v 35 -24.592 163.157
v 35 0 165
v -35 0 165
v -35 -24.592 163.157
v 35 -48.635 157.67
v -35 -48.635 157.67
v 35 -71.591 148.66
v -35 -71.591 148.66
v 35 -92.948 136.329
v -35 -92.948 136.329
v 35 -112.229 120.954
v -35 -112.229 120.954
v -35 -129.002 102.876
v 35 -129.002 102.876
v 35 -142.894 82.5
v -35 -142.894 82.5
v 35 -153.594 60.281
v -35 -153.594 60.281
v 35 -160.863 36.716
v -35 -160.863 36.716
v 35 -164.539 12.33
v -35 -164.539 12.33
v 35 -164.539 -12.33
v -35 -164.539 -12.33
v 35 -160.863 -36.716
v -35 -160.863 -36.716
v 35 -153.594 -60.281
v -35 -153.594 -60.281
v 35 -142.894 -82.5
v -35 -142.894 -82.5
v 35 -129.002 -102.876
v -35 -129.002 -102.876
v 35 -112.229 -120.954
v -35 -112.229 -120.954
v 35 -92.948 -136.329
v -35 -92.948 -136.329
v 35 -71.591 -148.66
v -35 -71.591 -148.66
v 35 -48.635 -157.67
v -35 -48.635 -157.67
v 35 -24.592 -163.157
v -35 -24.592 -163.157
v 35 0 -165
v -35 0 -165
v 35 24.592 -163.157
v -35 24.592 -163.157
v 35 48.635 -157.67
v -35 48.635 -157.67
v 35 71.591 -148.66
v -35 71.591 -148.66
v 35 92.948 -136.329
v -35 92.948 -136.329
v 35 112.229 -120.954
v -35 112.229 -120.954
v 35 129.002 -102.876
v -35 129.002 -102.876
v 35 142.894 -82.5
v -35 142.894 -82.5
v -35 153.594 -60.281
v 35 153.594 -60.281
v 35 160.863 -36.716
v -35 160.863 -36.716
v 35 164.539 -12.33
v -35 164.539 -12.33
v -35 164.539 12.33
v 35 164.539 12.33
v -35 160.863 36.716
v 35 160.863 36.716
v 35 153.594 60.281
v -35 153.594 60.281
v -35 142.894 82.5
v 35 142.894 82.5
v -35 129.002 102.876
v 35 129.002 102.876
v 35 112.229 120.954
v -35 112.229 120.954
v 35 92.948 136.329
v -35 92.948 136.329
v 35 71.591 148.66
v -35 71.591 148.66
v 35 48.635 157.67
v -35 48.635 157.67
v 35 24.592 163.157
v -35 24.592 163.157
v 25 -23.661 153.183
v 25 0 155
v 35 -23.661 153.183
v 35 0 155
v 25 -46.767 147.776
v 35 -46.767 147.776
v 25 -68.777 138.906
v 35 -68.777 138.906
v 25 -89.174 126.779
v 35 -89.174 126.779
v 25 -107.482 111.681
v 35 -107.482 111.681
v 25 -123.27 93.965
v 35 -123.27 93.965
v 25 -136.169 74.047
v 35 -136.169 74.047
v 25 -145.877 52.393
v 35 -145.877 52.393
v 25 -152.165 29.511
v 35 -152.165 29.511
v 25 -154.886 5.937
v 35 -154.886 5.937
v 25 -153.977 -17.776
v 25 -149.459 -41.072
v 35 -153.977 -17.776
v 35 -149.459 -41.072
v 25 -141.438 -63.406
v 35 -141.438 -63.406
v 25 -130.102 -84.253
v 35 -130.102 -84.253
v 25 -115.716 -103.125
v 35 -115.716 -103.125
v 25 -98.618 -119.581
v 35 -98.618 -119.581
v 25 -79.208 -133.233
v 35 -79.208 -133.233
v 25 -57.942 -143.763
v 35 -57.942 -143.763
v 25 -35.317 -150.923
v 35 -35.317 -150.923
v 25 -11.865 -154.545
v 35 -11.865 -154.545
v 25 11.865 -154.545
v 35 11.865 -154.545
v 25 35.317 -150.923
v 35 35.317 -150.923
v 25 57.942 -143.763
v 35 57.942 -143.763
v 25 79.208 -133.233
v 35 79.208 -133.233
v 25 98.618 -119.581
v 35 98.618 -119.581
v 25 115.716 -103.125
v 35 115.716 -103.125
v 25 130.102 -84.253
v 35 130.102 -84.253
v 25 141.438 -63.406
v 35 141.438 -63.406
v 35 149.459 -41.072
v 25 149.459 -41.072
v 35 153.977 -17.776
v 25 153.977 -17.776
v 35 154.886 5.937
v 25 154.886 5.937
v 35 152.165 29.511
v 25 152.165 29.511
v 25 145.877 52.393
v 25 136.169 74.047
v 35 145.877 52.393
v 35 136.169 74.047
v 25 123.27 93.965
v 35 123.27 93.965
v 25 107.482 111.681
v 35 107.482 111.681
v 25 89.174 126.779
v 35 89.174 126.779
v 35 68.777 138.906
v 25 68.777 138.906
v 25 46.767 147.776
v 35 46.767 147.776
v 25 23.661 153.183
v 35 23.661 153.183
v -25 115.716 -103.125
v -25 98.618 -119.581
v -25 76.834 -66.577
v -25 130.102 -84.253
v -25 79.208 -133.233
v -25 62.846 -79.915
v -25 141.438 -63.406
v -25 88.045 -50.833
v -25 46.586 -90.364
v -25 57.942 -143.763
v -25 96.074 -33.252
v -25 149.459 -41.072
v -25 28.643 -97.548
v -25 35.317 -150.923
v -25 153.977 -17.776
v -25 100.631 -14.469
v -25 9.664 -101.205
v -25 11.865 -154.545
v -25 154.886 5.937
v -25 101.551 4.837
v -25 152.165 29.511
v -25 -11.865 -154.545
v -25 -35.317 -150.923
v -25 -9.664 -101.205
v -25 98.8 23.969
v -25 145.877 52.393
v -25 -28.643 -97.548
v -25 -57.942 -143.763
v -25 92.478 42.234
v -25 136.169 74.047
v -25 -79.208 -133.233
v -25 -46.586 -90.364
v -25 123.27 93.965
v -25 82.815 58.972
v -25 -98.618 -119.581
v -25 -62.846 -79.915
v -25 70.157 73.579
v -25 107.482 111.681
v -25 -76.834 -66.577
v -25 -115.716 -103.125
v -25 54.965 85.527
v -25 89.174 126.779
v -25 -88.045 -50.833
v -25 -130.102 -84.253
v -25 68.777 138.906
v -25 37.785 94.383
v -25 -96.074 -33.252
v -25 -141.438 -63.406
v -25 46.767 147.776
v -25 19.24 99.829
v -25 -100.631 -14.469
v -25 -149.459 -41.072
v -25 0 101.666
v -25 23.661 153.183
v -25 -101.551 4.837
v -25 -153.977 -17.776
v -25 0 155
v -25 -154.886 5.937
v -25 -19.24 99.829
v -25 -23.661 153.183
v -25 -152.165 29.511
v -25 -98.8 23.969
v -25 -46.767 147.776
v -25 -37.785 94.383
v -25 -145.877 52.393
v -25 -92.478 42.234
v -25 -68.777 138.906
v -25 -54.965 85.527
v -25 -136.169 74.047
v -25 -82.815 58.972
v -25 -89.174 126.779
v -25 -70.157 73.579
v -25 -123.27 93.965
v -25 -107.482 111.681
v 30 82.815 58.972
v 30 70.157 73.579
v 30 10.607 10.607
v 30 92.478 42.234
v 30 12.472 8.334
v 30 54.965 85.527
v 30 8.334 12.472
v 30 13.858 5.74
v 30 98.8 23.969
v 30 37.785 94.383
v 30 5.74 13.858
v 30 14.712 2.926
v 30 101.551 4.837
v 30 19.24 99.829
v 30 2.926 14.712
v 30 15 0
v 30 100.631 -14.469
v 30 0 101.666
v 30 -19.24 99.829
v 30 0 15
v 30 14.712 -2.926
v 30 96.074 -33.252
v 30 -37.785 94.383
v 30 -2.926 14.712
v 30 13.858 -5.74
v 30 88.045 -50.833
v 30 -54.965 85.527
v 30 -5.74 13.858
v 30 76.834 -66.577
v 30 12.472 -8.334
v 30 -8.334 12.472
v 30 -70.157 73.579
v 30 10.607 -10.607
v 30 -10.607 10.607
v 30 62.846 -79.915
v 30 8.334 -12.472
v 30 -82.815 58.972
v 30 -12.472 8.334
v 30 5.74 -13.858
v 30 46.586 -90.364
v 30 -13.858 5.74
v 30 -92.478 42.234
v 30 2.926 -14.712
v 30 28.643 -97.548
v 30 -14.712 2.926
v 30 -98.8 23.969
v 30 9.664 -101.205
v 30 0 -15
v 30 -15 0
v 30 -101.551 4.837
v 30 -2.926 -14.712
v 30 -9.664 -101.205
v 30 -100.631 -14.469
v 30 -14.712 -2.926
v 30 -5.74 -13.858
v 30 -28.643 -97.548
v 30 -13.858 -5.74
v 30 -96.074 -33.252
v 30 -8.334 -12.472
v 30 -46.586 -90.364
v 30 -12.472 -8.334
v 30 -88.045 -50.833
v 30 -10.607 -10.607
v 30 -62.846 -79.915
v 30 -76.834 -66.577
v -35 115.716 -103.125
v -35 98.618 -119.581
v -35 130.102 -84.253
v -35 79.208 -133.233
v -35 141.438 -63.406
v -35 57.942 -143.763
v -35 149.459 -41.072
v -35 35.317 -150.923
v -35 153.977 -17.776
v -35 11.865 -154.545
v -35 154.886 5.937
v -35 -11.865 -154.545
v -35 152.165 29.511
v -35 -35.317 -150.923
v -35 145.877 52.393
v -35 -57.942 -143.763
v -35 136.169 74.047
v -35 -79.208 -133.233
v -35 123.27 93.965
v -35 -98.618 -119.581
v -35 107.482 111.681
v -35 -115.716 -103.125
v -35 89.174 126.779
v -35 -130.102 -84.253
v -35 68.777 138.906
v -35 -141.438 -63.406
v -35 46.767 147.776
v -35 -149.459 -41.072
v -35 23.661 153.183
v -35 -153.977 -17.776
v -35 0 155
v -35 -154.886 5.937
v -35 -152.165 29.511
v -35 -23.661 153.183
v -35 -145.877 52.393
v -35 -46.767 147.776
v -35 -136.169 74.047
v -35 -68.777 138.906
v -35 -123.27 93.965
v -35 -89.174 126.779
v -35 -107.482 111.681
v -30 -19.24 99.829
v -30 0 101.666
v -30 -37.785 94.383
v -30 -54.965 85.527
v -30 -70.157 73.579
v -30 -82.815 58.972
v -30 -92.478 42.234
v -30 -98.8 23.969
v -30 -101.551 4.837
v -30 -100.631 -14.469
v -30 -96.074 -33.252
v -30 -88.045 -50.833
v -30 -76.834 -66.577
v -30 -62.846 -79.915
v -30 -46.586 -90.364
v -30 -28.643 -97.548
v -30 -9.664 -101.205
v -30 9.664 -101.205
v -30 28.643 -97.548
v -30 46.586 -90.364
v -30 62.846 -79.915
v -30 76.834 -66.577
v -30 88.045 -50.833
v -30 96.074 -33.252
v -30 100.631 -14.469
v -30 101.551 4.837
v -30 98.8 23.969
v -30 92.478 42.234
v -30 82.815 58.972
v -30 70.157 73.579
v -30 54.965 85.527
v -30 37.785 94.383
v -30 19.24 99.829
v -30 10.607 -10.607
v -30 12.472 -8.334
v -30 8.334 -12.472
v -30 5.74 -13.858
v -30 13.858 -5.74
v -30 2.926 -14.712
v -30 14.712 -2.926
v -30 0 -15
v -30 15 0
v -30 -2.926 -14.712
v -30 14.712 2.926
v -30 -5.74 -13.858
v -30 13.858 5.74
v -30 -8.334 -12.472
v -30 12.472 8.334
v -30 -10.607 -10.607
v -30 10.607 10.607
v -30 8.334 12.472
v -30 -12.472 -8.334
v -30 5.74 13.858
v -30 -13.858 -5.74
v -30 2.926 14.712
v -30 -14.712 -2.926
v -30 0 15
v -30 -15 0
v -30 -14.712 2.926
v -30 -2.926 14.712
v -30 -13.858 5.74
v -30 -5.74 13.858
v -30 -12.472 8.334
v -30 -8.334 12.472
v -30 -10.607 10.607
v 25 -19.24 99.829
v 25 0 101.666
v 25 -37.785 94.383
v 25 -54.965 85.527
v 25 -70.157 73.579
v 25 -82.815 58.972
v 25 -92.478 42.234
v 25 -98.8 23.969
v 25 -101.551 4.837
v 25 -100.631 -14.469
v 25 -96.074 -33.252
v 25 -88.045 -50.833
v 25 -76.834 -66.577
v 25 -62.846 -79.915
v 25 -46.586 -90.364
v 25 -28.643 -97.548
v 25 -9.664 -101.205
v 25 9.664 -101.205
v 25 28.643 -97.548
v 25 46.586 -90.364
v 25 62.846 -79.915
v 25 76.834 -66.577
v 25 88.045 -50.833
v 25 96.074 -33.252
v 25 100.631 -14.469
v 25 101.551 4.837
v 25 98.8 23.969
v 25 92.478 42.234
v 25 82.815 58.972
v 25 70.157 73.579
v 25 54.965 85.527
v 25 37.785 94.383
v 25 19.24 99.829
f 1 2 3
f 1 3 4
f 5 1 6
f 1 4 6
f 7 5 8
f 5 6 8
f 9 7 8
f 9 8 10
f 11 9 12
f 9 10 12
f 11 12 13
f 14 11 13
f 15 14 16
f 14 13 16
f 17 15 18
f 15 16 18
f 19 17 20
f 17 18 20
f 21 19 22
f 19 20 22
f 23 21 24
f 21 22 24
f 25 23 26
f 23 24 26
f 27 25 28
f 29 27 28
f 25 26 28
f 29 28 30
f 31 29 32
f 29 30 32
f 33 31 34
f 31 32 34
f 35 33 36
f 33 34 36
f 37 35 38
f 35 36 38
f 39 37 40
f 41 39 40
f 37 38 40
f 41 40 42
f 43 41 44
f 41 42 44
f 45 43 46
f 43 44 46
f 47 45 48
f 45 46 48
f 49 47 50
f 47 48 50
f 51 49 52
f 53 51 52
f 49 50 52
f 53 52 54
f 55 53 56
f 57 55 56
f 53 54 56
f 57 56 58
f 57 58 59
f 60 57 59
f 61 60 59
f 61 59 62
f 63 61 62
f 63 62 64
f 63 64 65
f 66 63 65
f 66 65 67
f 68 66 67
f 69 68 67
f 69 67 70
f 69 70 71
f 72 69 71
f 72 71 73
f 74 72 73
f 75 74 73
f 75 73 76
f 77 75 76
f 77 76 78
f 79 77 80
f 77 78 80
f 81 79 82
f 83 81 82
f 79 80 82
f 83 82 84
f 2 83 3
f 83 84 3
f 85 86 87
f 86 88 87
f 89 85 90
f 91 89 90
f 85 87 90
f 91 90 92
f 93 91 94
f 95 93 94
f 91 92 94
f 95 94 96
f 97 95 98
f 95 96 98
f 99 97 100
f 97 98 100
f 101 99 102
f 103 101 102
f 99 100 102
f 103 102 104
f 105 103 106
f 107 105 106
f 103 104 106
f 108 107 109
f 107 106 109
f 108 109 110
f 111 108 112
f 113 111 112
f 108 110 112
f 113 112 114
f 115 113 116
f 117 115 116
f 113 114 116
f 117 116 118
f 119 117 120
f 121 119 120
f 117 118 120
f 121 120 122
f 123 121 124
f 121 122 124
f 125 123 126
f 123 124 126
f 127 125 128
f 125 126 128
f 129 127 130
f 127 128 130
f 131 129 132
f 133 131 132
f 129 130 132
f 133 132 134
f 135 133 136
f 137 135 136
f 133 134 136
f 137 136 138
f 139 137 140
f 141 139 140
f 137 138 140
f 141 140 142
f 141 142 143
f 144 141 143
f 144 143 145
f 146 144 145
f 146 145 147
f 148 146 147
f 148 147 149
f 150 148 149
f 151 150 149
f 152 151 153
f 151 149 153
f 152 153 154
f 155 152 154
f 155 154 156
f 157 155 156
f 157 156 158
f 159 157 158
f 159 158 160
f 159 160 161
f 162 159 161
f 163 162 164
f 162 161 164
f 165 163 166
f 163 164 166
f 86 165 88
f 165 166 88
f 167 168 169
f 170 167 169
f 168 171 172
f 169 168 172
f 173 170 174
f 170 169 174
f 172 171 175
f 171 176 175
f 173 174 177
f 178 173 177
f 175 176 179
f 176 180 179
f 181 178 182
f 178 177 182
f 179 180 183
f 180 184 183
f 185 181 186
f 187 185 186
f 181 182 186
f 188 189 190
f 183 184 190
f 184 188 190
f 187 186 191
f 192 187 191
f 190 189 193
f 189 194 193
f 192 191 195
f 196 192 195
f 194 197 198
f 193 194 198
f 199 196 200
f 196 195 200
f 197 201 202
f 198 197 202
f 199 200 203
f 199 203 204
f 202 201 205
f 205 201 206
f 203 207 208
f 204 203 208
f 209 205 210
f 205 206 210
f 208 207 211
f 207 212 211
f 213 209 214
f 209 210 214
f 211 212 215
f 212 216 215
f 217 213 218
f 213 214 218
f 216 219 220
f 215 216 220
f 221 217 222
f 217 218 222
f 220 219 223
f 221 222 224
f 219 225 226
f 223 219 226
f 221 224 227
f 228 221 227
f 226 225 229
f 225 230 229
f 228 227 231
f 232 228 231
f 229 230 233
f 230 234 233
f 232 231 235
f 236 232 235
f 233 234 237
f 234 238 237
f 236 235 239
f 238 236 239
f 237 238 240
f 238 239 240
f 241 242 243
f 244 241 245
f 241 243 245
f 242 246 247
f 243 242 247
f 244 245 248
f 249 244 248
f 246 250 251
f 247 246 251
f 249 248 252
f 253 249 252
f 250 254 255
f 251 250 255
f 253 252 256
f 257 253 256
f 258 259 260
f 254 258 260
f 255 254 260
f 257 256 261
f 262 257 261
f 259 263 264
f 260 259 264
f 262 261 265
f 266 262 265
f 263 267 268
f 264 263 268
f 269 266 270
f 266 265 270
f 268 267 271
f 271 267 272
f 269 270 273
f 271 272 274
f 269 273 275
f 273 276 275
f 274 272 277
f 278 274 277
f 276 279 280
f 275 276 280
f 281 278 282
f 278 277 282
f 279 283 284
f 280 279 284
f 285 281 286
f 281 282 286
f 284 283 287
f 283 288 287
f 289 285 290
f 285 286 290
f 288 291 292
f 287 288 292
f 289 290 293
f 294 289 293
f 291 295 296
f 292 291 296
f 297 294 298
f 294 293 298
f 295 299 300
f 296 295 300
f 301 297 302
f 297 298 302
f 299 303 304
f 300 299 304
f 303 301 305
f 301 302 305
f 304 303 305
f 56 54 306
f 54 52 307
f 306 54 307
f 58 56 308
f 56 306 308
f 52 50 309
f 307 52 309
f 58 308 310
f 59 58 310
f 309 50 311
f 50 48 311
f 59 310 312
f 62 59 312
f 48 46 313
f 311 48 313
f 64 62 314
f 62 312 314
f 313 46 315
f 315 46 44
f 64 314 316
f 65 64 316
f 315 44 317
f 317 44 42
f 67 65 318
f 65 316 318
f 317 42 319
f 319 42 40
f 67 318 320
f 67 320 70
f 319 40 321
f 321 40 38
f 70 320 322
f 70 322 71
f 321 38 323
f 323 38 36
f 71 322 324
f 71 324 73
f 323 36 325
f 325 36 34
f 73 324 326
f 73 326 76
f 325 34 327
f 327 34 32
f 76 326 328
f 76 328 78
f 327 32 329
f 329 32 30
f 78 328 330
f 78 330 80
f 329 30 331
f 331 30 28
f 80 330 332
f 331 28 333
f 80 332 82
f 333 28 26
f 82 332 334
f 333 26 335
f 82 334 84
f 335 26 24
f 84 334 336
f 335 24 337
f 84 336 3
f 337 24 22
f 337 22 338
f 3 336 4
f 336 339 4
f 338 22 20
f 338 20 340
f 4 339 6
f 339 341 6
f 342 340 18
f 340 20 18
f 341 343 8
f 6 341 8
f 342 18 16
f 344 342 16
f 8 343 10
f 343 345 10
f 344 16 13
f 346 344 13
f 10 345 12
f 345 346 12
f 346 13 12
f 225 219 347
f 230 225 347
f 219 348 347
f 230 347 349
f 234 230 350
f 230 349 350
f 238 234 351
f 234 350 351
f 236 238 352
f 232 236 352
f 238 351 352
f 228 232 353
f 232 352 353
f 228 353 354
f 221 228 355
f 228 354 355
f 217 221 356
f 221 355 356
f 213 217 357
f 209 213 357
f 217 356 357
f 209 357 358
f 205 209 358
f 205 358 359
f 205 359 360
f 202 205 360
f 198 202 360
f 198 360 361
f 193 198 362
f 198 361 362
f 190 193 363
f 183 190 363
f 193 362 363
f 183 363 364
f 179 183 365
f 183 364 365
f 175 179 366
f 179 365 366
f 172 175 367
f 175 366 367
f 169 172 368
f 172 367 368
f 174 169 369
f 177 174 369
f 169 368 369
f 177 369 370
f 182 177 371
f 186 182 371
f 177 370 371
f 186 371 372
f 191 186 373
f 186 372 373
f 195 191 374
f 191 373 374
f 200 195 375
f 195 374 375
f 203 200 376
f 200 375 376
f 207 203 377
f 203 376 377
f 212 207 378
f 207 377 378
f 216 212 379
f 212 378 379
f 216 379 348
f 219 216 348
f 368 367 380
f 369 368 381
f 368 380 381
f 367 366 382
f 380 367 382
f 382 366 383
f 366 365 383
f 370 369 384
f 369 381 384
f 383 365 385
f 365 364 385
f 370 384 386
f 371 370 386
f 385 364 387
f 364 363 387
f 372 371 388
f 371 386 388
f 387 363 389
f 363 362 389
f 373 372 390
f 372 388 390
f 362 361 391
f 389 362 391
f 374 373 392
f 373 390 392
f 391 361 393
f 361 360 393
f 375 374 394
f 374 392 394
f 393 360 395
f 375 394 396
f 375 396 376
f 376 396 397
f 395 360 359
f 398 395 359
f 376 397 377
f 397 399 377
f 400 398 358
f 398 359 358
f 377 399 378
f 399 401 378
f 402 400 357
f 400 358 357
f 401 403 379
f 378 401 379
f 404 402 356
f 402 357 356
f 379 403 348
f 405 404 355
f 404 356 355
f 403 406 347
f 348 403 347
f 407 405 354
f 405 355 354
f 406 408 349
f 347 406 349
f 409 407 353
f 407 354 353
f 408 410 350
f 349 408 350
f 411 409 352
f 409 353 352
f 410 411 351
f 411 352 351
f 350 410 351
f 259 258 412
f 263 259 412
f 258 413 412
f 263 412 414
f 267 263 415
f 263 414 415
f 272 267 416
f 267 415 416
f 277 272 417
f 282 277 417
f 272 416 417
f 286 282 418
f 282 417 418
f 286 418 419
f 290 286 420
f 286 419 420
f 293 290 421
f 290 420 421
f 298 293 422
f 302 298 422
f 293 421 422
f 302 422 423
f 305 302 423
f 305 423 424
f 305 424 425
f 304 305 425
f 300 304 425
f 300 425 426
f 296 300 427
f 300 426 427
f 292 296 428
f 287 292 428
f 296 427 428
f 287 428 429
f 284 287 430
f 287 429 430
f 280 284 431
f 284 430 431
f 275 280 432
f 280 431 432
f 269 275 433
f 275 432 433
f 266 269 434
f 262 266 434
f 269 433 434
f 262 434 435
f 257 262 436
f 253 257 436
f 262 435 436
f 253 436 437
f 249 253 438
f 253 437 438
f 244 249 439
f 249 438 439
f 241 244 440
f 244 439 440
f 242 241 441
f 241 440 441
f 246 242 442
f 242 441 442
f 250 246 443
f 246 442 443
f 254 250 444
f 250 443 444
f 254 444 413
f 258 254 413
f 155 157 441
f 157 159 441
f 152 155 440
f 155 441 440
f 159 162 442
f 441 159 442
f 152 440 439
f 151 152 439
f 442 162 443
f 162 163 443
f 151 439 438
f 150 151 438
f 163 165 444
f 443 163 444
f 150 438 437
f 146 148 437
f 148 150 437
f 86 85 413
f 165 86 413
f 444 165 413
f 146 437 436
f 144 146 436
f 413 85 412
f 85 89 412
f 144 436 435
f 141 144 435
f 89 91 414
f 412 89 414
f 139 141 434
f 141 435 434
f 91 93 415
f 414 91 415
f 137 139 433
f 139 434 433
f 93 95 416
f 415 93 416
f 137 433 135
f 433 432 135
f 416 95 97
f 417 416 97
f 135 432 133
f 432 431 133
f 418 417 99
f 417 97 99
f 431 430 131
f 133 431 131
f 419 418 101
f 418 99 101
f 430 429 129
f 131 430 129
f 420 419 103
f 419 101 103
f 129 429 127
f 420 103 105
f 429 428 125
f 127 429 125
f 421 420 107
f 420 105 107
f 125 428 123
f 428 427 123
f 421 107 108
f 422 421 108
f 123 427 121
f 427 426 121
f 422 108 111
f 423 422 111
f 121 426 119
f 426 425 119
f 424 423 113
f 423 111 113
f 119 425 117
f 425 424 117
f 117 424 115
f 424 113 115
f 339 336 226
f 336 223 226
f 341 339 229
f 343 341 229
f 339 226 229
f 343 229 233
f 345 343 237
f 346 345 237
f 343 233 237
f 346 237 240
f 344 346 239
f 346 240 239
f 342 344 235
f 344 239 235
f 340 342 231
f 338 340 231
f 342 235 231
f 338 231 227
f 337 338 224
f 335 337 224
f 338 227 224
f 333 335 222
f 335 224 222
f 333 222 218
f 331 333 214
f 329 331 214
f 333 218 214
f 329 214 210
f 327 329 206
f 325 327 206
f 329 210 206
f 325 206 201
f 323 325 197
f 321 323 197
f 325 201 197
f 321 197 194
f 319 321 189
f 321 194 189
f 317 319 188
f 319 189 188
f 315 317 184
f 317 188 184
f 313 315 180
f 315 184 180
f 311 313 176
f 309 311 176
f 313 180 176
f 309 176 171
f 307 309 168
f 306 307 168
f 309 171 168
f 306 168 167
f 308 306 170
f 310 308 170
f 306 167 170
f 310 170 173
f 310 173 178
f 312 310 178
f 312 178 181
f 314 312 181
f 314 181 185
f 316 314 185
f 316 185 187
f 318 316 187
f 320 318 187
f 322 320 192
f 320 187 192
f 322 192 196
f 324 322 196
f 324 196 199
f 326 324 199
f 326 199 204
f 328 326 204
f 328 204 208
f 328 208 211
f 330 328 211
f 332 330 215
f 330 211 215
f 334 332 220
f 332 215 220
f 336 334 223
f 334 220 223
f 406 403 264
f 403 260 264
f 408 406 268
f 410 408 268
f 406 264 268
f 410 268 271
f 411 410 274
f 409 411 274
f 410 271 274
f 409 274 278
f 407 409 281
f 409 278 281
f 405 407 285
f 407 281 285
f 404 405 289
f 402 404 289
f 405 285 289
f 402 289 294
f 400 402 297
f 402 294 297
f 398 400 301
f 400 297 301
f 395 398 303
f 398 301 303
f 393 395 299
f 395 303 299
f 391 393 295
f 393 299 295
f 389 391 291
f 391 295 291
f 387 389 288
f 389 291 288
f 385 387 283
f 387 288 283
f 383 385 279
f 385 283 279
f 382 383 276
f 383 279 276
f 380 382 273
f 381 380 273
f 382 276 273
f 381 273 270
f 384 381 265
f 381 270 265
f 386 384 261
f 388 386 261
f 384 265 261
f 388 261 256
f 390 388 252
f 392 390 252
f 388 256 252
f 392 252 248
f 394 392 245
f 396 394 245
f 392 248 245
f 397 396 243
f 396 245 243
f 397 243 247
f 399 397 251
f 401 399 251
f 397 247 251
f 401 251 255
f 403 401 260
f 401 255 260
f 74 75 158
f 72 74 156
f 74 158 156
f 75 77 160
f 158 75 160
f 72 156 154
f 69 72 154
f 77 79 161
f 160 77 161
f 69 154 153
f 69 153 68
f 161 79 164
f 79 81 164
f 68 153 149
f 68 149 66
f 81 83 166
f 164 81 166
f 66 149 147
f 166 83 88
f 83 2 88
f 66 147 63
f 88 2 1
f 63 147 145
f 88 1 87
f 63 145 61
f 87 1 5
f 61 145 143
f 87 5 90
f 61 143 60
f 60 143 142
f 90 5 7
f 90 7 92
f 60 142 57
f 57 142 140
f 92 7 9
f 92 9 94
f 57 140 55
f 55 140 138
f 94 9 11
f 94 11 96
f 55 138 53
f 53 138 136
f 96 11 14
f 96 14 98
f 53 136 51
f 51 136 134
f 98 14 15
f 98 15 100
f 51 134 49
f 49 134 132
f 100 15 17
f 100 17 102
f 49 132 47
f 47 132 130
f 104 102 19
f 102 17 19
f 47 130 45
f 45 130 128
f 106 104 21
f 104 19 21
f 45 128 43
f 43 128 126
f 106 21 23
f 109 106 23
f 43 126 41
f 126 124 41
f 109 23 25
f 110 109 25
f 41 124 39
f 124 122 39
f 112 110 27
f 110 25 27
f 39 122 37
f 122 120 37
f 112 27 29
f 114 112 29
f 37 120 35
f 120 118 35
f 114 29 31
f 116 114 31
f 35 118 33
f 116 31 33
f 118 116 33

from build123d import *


with BuildPart() as part:
    # Sketch3 → Revolve1 (revolve)
    with BuildSketch(Plane.XY, mode=Mode.PRIVATE) as revolve1_sk:
        Polygon((-25, 15), (0, 15), (0, 165), (-35, 165), (-35, 155), (-25, 155), (-25, 101.665831819), (-30, 101.665831819), (-30, 15), align=None)
        Polygon((0, 165), (0, 15), (25, 15), (30, 15), (30, 101.665831819), (25, 101.665831819), (25, 155), (35, 155), (35, 165), align=None)
    revolve(revolve1_sk.sketch.rotate(Axis((0, 0, 0), (1, 0, 0)), 90), axis=Axis((0, 0, 0), (1, 0, 0)))


solid = part.part
